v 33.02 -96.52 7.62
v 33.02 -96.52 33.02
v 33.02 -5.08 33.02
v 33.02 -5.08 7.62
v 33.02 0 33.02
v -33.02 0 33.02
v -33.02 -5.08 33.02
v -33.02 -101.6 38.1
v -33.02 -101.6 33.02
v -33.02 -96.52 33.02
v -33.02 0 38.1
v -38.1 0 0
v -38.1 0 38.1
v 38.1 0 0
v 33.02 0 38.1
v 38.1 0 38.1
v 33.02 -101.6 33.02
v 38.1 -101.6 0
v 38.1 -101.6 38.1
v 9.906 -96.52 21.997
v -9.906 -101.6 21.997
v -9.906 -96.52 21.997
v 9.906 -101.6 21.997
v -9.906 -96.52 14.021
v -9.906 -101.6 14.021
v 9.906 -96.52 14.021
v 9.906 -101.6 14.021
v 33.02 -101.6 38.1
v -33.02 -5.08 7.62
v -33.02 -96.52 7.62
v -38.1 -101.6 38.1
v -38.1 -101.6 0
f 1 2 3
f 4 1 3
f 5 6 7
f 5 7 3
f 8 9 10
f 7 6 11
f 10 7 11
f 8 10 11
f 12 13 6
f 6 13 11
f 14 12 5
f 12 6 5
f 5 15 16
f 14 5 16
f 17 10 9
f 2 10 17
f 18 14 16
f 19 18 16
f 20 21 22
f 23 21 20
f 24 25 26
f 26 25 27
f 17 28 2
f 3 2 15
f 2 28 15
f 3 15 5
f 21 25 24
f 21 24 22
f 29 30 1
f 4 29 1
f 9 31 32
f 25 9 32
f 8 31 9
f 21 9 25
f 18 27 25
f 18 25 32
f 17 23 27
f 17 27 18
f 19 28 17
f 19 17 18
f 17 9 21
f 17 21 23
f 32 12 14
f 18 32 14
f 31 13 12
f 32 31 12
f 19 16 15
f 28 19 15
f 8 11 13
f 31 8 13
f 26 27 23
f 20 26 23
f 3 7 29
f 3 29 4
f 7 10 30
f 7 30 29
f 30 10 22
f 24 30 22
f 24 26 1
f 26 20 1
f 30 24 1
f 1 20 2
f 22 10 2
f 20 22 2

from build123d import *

# Parameters (mm, degrees)
F0_W     = 66.04
F0_H     = 27.94
F1_DEPTH = 101.6
F2_W     = 66.040002
F2_H     = 91.44
F3_DEPTH = 25.4
F4_W     = 19.812
F4_H     = 7.9756
F5_DEPTH = 12.7


with BuildPart() as f1:
    # F0 (on Front) → F1 (new body)
    with BuildSketch(Plane.XZ):
        Polygon((-38.1, 0), (-33.02, 0), (-33.02, 5.08), (-33.02, 33.02), (-33.02, 38.1), (-38.1, 38.1), align=None)
        Polygon((-33.02, 0), (0, 0), (33.02, 0), (33.02, 5.08), (-33.02, 5.08), align=None)
        Polygon((33.02, 5.08), (33.02, 0), (38.1, 0), (38.1, 38.1), (33.02, 38.1), (33.02, 33.02), align=None)
        with Locations((0, 19.05)):
            Rectangle(F0_W, F0_H)
    extrude(amount=F1_DEPTH)

    # F2 (on face) → F3 (cut)
    with BuildSketch(Plane.XY.offset(33.02)):
        with Locations((0, -50.8)):
            Rectangle(F2_W, F2_H)
    extrude(amount=-F3_DEPTH, mode=Mode.SUBTRACT)

    # F4 (on face) → F5 (cut)
    with BuildSketch(Plane.XZ.offset(101.6)):
        with Locations((0, 18.008964)):
            Rectangle(F4_W, F4_H)
    extrude(amount=-F5_DEPTH, mode=Mode.SUBTRACT)


solid = f1.part
